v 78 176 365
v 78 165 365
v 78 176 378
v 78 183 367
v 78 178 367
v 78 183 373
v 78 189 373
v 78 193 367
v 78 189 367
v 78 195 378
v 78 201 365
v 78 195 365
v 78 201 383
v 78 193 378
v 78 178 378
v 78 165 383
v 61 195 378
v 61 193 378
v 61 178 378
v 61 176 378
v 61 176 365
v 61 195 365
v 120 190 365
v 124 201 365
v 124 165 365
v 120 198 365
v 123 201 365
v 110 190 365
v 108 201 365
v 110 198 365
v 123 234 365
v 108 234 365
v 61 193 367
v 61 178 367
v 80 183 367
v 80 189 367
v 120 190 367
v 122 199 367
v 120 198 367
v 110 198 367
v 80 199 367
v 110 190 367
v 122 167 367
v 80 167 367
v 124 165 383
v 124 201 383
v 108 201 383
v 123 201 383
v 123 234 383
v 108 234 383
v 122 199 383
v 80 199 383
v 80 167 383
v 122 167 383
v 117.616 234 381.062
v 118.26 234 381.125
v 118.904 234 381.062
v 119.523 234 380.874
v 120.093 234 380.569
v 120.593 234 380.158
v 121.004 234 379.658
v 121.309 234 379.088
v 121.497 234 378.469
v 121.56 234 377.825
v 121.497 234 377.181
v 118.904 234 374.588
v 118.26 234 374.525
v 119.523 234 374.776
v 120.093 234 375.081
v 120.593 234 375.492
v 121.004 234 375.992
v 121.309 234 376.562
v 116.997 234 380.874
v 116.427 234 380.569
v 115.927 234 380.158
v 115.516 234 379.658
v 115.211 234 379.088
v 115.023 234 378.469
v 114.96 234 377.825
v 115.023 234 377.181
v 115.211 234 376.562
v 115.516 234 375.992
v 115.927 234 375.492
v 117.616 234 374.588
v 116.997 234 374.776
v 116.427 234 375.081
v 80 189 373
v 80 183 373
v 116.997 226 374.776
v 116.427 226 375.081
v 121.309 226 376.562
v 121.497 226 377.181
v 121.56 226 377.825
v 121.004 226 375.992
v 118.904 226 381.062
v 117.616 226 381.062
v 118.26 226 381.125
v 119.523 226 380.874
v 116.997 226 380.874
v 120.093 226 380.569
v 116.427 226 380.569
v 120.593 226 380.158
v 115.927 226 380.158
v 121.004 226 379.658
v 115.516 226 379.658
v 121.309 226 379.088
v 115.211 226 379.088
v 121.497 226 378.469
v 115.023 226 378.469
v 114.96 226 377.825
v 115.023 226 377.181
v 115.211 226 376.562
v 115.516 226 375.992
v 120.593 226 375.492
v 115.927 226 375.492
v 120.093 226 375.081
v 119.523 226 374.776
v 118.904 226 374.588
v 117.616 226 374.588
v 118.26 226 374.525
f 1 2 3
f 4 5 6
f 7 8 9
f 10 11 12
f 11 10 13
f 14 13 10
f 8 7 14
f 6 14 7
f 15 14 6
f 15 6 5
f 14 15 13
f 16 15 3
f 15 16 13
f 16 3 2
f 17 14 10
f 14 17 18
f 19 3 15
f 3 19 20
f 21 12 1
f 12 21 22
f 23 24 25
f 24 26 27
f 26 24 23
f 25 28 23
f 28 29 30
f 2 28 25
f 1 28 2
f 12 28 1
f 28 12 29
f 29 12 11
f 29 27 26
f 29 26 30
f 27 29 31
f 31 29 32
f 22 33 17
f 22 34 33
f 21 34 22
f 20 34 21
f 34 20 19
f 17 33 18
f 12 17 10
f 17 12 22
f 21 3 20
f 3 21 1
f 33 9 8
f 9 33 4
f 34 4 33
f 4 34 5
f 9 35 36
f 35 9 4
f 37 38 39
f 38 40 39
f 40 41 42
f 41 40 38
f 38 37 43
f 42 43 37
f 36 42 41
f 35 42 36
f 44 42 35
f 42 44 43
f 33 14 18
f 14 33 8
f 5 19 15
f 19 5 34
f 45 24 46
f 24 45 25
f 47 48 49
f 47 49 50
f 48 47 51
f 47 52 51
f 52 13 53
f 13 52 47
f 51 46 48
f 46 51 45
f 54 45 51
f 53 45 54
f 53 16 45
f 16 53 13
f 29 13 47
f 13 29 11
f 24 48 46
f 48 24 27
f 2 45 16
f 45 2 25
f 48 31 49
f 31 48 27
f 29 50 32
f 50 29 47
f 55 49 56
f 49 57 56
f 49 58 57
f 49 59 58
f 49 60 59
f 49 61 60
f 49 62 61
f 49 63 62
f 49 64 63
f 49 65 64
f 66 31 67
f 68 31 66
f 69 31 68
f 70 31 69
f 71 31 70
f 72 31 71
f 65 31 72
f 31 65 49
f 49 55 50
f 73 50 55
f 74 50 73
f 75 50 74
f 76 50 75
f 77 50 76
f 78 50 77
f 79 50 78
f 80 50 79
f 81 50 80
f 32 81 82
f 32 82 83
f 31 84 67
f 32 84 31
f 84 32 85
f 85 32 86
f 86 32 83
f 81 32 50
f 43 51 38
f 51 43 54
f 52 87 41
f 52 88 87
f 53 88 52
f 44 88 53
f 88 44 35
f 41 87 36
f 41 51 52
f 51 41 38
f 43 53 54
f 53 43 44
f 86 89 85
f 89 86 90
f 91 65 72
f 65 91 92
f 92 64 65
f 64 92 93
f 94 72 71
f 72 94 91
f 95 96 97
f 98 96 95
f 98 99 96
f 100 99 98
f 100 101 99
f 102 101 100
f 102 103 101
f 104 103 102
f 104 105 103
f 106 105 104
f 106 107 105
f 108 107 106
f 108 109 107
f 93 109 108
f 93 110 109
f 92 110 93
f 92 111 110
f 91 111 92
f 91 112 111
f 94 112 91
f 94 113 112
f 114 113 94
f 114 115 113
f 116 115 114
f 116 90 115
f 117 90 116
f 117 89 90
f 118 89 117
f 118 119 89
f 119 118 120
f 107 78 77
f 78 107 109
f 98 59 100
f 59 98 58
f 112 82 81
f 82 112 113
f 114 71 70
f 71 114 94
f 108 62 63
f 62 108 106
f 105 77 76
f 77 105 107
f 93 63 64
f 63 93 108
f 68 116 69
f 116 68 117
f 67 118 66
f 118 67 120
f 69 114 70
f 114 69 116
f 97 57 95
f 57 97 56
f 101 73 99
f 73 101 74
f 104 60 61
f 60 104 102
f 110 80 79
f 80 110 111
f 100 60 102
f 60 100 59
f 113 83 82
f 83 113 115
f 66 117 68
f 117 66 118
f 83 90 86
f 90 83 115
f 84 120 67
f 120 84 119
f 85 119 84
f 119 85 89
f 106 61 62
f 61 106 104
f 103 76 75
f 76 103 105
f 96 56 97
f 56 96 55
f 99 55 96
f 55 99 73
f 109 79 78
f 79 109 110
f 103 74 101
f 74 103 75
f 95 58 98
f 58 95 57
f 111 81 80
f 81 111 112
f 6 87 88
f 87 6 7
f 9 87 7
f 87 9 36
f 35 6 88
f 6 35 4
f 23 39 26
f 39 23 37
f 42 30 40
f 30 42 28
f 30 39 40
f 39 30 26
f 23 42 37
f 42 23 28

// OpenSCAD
// Fan junction box: PLACEMENT CONCEPT only (2026-11-07). Not a part design; nothing here is for printing.
// Rack frame as rack_top_fan.scad: X centred, Y 0 front .. 240 rear, Z 0 = bottom of slot 9, post tops Z 400.05.
// Posts are simplified stand-ins from the 4U post card (flange Y 0..6 / 234..240, X 111.12..143, side wall to Y 35 / from 205).
// CM1000 = envelope (212.6 x 38 x 136, front at Y ~4) in slot 1. Wagos = datasheet sizes (Brian 2026-11-07: use datasheet).
part="box";   // posts | modem | box | wagos | socket | cable
$fn=32;
u=44.45; z_top=400.05; zc1=z_top-u/2;       // slot 1 (U9) centre 377.8
module post(){ // one right front post, Z from 400.05-4U to 400.05
  translate([111.12,0,z_top-4*u]) cube([143-111.12,6,4*u]);
  translate([127.12,0,z_top-4*u]) cube([143-127.12,35,4*u]);
}
if(part=="posts") for(s=[-1,1]) scale([s,1,1]){ post(); translate([0,240,0]) mirror([0,1,0]) post(); }
if(part=="modem") translate([-106.3,4,zc1-19]) cube([212.6,136,38]);

// COMPACT concept v2 (Brian: "HAS to be more compact"): only power is spliced. 2 x 221-413 (12 V bus, GND bus);
// ARGB 5 V / DATA / GND, PWM and TACH pass straight through unspliced. Brick socket adapter clips OUTSIDE the -X wall.
bx=[78,124]; by=[165,201]; bz=[365,383]; w=2;
if(part=="box") difference(){
  union(){
    translate([bx[0],by[0],bz[0]]) cube([bx[1]-bx[0],by[1]-by[0],bz[1]-bz[0]]);
    translate([108,by[1]-1,bz[0]]) cube([15,234-by[1]+1,bz[1]-bz[0]]);   // tab to the flange's front face (Y 234)
    translate([bx[0]-17,176,bz[0]]) difference(){ cube([17,19,13]); translate([-1,2,2]) cube([19,15,20]); } // open cradle for the socket adapter
  }
  translate([bx[0]+w,by[0]+w,bz[0]+w]) cube([bx[1]-bx[0]-2*w,by[1]-by[0]-2*w,30]);
  translate([118.26,226,zc1]) rotate([-90,0,0]) cylinder(d=6.6,h=20);    // M6 x 8 into an insert in the post's U9 middle hole
  translate([bx[0]-1,183,bz[0]+w]) cube([w+2,6,6]);                      // brick socket leads in
  translate([110,190,bz[0]-1]) cube([10,8,w+2]);                         // 6-core exit, down the rear post lane
  translate([110,168,bz[1]-w-1]) cube([12,9,w+2]);                       // CT200 leads in from the top
}
module wago(wd){ translate([0,0,bz[0]+w]) { cube([wd,18.6,8.3]); color("orange") translate([1,12,8.3]) cube([wd-2,4.6,1.5]); } }
if(part=="wagos") for(i=[0:1]) translate([bx[0]+w+1+i*20.7,by[1]-w-18.6,0]) wago(18.7);   // entries face -Y, 12+ mm of wire room in front
// screw-terminal DC socket adapter (approx. 38 long, 11.5 barrel + 15 x 15 terminal block), lying in the cradle, mouth facing -X
if(part=="socket") translate([bx[0]-40,185.5,bz[0]+2+7.5]) rotate([0,90,0]) { cylinder(d=11.5,h=18); translate([-7.5,-7.5,18]) cube([15,15,22]); }
// 6-core cable down the rear post lane to the Pi (slots 5-6), and CT200 leads up to the fan
if(part=="cable"){ translate([115,194,240]) cylinder(d=6,h=bz[0]-240); translate([116,172,bz[1]]) cylinder(d=5,h=z_top+15-bz[1]); }
